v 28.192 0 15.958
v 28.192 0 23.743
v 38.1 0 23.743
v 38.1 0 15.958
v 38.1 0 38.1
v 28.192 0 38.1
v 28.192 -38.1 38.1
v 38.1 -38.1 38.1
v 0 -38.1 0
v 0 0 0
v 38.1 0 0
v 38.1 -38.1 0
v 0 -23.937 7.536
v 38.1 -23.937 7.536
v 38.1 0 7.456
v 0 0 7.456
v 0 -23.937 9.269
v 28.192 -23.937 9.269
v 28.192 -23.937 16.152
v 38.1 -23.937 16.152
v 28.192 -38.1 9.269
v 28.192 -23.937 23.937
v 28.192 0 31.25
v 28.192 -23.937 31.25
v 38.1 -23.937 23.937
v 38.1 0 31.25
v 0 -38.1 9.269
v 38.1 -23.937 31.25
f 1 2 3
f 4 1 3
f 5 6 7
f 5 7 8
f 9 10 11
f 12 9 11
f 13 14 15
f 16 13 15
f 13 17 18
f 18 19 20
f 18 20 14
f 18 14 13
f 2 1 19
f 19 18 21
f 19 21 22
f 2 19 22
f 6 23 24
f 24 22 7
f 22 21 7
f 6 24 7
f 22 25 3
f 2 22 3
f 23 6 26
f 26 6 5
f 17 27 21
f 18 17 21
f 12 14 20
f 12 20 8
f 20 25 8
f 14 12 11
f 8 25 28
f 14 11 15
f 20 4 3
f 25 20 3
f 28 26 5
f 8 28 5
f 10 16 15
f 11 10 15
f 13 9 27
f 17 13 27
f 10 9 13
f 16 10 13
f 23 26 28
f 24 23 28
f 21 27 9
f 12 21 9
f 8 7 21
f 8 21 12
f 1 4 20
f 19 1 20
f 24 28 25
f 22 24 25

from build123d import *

# Parameters (mm, degrees)
F0_W     = 38.1
F0_H     = 38.1
F1_DEPTH = 38.1
F4_DEPTH = 38.1
F5_W     = 28.191894
F5_H     = 28.831113
F6_DEPTH = 38.1


with BuildPart() as f1:
    # F0 (on Front) → F1 (new body)
    with BuildSketch(Plane.XZ):
        with Locations((19.05, 19.05)):
            Rectangle(F0_W, F0_H)
    extrude(amount=F1_DEPTH)

    # F3 (on face) → F4 (cut)
    with BuildSketch(Plane.YZ.offset(38.1)):
        Polygon((0, 23.742571), (0, 31.250443), (-23.93651, 31.250443), (-23.93651, 23.93651), align=None)
        Polygon((0, 7.535568), (0, 15.957672), (-23.936734, 16.151613), (-23.936734, 7.535568), (0, 7.456388), align=None)
    extrude(amount=-F4_DEPTH, mode=Mode.SUBTRACT)

    # F5 (on offset) → F6 (cut)
    with BuildSketch(Plane.XZ.offset(38.1)):
        with Locations((14.095947, 23.684444)):
            Rectangle(F5_W, F5_H)
    extrude(amount=-F6_DEPTH, mode=Mode.SUBTRACT)


solid = f1.part
